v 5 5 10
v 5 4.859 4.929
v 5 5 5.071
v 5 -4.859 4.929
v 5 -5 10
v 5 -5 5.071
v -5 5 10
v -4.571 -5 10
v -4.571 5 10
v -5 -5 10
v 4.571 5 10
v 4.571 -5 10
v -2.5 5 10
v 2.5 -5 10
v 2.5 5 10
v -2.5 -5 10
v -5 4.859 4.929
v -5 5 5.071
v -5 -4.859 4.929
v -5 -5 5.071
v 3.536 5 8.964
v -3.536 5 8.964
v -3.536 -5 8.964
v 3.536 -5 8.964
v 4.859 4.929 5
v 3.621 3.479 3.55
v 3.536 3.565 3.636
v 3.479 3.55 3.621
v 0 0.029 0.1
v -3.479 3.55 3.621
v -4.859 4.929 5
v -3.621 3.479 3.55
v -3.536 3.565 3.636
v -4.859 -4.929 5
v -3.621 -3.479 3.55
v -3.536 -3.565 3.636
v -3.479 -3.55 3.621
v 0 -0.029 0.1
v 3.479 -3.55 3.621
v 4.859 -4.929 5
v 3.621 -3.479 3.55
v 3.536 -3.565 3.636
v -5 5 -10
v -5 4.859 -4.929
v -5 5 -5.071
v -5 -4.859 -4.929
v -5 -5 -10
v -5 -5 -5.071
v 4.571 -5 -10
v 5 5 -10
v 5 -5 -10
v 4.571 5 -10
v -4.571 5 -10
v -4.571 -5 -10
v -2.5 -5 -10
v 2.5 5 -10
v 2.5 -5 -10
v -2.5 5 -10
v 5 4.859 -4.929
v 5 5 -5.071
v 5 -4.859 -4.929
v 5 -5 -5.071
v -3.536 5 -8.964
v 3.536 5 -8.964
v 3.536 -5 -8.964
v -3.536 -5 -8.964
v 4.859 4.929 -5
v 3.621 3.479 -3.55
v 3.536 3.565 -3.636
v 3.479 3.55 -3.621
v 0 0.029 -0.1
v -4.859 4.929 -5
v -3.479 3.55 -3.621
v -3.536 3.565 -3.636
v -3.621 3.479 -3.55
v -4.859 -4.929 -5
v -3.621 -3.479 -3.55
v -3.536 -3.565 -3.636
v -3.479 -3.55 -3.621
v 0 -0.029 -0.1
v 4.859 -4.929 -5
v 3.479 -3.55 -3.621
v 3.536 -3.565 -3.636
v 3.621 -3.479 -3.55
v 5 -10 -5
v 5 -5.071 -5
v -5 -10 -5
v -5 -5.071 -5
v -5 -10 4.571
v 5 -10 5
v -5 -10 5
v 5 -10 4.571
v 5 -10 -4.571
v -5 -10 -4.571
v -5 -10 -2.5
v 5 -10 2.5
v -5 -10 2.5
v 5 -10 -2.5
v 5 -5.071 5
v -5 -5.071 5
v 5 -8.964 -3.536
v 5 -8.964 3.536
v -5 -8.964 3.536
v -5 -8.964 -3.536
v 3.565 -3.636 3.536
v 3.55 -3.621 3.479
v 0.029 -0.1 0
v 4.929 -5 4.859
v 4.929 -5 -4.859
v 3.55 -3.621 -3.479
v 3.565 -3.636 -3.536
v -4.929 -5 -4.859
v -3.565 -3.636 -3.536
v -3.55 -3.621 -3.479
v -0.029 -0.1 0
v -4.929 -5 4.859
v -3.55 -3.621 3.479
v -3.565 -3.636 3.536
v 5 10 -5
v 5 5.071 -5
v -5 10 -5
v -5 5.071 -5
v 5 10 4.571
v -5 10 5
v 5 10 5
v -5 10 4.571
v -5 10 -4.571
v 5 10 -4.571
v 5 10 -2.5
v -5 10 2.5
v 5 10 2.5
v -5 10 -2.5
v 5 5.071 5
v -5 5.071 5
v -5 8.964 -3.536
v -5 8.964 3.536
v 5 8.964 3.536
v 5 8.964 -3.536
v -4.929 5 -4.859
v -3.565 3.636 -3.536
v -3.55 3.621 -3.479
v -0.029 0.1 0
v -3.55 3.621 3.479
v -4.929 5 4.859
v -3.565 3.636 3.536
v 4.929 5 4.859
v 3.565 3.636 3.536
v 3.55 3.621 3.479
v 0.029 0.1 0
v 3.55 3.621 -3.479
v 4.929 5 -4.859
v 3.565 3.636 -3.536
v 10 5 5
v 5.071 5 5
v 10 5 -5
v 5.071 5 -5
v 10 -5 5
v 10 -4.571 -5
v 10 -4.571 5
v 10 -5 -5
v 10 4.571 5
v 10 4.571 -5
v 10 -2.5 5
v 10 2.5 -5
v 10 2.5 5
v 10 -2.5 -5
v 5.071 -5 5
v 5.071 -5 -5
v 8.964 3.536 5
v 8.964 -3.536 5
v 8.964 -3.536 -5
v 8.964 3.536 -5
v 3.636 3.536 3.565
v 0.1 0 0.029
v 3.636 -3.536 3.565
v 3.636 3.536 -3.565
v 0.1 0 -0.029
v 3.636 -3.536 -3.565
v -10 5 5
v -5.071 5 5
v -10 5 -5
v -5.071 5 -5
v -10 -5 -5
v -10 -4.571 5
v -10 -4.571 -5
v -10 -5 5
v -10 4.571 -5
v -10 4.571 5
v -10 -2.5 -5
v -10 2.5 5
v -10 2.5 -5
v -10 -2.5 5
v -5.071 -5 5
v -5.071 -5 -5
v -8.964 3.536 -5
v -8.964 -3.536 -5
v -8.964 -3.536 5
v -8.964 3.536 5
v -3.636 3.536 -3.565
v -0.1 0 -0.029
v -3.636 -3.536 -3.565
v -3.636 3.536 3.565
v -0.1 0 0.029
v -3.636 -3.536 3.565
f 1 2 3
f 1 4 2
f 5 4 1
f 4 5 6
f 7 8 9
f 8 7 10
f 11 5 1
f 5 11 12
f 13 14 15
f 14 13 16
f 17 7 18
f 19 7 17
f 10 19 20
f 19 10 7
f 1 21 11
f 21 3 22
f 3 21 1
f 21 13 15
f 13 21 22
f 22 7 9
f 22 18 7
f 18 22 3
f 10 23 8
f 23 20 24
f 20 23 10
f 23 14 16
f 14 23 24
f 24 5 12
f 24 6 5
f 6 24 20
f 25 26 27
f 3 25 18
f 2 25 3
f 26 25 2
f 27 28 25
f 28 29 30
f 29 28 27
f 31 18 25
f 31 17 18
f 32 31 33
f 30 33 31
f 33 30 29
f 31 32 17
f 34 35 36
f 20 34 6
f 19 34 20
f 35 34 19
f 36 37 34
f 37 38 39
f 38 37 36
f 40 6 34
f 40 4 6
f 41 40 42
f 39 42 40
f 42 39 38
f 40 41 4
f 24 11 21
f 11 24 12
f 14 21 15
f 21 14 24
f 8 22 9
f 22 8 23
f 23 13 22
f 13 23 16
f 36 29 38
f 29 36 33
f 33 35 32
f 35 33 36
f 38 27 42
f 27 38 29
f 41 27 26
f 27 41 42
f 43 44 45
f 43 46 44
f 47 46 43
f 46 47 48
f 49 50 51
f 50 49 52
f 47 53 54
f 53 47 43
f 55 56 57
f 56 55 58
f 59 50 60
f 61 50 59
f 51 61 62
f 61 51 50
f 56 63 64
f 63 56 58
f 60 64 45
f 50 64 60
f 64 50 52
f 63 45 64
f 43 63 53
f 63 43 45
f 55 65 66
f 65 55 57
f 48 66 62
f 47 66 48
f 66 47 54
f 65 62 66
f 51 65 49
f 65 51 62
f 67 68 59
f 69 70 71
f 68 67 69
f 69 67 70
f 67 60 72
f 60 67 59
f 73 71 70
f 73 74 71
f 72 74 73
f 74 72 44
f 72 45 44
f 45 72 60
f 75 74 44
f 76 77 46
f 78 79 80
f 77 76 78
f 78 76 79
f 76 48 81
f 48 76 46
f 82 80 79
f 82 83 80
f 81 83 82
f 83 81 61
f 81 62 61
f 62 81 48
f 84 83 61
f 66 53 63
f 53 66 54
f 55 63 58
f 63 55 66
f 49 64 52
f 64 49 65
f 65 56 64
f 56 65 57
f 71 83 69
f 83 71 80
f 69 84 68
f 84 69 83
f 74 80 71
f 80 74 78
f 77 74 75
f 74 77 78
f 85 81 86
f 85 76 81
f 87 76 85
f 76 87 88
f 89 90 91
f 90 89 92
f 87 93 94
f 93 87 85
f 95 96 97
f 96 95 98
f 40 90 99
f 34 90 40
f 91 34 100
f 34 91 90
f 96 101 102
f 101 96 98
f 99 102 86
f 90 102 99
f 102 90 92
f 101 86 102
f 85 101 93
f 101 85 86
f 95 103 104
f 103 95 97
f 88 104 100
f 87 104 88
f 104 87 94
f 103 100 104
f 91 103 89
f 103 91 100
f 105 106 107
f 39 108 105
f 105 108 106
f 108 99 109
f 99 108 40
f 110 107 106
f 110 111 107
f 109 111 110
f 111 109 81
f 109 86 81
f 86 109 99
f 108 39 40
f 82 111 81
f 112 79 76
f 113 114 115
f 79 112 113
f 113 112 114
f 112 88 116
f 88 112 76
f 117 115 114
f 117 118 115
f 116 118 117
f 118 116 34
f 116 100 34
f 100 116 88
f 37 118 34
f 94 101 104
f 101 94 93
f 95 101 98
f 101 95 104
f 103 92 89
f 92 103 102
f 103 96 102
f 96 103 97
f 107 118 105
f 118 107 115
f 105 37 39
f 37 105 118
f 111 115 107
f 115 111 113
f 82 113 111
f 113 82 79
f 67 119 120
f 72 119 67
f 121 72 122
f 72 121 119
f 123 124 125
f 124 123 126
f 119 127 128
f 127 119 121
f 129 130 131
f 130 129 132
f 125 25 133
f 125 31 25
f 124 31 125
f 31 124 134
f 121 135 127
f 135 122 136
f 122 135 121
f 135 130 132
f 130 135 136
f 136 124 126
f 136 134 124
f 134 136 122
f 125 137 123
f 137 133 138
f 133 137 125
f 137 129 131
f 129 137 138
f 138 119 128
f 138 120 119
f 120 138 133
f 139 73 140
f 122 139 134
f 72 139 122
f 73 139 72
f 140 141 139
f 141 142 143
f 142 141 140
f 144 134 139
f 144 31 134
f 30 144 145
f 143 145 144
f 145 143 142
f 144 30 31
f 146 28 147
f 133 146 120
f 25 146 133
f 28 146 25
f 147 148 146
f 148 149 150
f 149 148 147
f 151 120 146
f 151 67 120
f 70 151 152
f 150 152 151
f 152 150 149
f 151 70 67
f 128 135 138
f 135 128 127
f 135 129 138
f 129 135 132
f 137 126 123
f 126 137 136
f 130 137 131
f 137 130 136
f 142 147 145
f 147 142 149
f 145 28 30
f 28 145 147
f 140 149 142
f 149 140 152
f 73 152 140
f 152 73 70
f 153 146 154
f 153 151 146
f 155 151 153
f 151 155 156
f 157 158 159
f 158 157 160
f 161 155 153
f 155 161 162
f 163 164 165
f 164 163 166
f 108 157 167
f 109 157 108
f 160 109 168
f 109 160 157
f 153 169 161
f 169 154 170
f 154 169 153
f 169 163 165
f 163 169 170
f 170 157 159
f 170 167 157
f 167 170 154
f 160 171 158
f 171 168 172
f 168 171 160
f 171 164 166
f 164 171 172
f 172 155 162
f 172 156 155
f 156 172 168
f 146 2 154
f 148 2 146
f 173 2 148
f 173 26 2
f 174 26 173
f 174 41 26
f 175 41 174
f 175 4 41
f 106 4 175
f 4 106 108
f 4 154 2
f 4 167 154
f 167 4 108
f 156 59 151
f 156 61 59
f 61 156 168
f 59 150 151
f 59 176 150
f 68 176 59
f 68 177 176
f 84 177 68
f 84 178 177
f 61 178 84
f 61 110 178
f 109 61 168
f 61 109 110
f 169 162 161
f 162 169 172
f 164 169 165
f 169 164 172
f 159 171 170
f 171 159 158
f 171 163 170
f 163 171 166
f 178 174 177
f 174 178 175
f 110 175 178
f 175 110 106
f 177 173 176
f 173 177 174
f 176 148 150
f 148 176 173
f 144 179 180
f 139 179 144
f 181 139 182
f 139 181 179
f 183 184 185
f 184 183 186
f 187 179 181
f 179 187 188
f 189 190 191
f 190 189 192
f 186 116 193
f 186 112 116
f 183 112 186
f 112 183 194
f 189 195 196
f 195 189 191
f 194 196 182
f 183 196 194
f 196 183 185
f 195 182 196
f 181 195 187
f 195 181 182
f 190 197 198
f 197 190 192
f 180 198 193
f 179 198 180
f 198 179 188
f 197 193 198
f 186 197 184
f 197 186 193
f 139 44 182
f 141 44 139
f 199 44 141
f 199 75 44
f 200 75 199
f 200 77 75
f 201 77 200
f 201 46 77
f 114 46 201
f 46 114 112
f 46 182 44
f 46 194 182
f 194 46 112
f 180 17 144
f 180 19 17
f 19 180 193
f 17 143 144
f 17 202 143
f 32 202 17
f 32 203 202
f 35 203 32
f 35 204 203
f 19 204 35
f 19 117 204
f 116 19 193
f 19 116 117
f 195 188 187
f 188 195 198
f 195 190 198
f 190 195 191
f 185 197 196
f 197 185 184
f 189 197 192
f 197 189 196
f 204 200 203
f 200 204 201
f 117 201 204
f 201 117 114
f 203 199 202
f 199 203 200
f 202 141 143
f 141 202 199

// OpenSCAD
cote=25;
epsilon=0.1;
d=cote*sqrt(2)/4;
de=d+epsilon;


module piece() {
difference() {
     intersection()
     {
	  sphere(cote*sqrt(2)/2, $fn=50);
	  translate([-5,-5,0]) cube(10,10,10);
     }

     translate([0, cote/4, 0]) rotate([45, 0, 0]) cube([10, de, de], center=true);
     translate([0, -cote/4, 0]) rotate([45, 0, 0]) cube([10, de, de], center=true);

     translate([d, 0, d+cote/2]) rotate([0,45,0]) cube([10, cote, cote], center=true);
     translate([-d, 0, d+cote/2]) rotate([0,-45,0]) cube([10, cote, cote], center=true);

     translate([-d, 0, -d+epsilon]) rotate([0,45,0]) cube([10, cote/2, cote], center=true);
     translate([d, 0, -d+epsilon]) rotate([0,-45,0]) cube([10, cote/2, cote], center=true);
}
}
piece();
// #cube(cote, center=true);

rotate([0, 180, 0]) piece();
rotate([90, 90, 0]) piece();
rotate([-90, 90, 0]) piece();
rotate([0, 90, 0]) rotate([0, 0, 90]) piece();
rotate([0, -90, 0]) rotate([0, 0, 90]) piece();
